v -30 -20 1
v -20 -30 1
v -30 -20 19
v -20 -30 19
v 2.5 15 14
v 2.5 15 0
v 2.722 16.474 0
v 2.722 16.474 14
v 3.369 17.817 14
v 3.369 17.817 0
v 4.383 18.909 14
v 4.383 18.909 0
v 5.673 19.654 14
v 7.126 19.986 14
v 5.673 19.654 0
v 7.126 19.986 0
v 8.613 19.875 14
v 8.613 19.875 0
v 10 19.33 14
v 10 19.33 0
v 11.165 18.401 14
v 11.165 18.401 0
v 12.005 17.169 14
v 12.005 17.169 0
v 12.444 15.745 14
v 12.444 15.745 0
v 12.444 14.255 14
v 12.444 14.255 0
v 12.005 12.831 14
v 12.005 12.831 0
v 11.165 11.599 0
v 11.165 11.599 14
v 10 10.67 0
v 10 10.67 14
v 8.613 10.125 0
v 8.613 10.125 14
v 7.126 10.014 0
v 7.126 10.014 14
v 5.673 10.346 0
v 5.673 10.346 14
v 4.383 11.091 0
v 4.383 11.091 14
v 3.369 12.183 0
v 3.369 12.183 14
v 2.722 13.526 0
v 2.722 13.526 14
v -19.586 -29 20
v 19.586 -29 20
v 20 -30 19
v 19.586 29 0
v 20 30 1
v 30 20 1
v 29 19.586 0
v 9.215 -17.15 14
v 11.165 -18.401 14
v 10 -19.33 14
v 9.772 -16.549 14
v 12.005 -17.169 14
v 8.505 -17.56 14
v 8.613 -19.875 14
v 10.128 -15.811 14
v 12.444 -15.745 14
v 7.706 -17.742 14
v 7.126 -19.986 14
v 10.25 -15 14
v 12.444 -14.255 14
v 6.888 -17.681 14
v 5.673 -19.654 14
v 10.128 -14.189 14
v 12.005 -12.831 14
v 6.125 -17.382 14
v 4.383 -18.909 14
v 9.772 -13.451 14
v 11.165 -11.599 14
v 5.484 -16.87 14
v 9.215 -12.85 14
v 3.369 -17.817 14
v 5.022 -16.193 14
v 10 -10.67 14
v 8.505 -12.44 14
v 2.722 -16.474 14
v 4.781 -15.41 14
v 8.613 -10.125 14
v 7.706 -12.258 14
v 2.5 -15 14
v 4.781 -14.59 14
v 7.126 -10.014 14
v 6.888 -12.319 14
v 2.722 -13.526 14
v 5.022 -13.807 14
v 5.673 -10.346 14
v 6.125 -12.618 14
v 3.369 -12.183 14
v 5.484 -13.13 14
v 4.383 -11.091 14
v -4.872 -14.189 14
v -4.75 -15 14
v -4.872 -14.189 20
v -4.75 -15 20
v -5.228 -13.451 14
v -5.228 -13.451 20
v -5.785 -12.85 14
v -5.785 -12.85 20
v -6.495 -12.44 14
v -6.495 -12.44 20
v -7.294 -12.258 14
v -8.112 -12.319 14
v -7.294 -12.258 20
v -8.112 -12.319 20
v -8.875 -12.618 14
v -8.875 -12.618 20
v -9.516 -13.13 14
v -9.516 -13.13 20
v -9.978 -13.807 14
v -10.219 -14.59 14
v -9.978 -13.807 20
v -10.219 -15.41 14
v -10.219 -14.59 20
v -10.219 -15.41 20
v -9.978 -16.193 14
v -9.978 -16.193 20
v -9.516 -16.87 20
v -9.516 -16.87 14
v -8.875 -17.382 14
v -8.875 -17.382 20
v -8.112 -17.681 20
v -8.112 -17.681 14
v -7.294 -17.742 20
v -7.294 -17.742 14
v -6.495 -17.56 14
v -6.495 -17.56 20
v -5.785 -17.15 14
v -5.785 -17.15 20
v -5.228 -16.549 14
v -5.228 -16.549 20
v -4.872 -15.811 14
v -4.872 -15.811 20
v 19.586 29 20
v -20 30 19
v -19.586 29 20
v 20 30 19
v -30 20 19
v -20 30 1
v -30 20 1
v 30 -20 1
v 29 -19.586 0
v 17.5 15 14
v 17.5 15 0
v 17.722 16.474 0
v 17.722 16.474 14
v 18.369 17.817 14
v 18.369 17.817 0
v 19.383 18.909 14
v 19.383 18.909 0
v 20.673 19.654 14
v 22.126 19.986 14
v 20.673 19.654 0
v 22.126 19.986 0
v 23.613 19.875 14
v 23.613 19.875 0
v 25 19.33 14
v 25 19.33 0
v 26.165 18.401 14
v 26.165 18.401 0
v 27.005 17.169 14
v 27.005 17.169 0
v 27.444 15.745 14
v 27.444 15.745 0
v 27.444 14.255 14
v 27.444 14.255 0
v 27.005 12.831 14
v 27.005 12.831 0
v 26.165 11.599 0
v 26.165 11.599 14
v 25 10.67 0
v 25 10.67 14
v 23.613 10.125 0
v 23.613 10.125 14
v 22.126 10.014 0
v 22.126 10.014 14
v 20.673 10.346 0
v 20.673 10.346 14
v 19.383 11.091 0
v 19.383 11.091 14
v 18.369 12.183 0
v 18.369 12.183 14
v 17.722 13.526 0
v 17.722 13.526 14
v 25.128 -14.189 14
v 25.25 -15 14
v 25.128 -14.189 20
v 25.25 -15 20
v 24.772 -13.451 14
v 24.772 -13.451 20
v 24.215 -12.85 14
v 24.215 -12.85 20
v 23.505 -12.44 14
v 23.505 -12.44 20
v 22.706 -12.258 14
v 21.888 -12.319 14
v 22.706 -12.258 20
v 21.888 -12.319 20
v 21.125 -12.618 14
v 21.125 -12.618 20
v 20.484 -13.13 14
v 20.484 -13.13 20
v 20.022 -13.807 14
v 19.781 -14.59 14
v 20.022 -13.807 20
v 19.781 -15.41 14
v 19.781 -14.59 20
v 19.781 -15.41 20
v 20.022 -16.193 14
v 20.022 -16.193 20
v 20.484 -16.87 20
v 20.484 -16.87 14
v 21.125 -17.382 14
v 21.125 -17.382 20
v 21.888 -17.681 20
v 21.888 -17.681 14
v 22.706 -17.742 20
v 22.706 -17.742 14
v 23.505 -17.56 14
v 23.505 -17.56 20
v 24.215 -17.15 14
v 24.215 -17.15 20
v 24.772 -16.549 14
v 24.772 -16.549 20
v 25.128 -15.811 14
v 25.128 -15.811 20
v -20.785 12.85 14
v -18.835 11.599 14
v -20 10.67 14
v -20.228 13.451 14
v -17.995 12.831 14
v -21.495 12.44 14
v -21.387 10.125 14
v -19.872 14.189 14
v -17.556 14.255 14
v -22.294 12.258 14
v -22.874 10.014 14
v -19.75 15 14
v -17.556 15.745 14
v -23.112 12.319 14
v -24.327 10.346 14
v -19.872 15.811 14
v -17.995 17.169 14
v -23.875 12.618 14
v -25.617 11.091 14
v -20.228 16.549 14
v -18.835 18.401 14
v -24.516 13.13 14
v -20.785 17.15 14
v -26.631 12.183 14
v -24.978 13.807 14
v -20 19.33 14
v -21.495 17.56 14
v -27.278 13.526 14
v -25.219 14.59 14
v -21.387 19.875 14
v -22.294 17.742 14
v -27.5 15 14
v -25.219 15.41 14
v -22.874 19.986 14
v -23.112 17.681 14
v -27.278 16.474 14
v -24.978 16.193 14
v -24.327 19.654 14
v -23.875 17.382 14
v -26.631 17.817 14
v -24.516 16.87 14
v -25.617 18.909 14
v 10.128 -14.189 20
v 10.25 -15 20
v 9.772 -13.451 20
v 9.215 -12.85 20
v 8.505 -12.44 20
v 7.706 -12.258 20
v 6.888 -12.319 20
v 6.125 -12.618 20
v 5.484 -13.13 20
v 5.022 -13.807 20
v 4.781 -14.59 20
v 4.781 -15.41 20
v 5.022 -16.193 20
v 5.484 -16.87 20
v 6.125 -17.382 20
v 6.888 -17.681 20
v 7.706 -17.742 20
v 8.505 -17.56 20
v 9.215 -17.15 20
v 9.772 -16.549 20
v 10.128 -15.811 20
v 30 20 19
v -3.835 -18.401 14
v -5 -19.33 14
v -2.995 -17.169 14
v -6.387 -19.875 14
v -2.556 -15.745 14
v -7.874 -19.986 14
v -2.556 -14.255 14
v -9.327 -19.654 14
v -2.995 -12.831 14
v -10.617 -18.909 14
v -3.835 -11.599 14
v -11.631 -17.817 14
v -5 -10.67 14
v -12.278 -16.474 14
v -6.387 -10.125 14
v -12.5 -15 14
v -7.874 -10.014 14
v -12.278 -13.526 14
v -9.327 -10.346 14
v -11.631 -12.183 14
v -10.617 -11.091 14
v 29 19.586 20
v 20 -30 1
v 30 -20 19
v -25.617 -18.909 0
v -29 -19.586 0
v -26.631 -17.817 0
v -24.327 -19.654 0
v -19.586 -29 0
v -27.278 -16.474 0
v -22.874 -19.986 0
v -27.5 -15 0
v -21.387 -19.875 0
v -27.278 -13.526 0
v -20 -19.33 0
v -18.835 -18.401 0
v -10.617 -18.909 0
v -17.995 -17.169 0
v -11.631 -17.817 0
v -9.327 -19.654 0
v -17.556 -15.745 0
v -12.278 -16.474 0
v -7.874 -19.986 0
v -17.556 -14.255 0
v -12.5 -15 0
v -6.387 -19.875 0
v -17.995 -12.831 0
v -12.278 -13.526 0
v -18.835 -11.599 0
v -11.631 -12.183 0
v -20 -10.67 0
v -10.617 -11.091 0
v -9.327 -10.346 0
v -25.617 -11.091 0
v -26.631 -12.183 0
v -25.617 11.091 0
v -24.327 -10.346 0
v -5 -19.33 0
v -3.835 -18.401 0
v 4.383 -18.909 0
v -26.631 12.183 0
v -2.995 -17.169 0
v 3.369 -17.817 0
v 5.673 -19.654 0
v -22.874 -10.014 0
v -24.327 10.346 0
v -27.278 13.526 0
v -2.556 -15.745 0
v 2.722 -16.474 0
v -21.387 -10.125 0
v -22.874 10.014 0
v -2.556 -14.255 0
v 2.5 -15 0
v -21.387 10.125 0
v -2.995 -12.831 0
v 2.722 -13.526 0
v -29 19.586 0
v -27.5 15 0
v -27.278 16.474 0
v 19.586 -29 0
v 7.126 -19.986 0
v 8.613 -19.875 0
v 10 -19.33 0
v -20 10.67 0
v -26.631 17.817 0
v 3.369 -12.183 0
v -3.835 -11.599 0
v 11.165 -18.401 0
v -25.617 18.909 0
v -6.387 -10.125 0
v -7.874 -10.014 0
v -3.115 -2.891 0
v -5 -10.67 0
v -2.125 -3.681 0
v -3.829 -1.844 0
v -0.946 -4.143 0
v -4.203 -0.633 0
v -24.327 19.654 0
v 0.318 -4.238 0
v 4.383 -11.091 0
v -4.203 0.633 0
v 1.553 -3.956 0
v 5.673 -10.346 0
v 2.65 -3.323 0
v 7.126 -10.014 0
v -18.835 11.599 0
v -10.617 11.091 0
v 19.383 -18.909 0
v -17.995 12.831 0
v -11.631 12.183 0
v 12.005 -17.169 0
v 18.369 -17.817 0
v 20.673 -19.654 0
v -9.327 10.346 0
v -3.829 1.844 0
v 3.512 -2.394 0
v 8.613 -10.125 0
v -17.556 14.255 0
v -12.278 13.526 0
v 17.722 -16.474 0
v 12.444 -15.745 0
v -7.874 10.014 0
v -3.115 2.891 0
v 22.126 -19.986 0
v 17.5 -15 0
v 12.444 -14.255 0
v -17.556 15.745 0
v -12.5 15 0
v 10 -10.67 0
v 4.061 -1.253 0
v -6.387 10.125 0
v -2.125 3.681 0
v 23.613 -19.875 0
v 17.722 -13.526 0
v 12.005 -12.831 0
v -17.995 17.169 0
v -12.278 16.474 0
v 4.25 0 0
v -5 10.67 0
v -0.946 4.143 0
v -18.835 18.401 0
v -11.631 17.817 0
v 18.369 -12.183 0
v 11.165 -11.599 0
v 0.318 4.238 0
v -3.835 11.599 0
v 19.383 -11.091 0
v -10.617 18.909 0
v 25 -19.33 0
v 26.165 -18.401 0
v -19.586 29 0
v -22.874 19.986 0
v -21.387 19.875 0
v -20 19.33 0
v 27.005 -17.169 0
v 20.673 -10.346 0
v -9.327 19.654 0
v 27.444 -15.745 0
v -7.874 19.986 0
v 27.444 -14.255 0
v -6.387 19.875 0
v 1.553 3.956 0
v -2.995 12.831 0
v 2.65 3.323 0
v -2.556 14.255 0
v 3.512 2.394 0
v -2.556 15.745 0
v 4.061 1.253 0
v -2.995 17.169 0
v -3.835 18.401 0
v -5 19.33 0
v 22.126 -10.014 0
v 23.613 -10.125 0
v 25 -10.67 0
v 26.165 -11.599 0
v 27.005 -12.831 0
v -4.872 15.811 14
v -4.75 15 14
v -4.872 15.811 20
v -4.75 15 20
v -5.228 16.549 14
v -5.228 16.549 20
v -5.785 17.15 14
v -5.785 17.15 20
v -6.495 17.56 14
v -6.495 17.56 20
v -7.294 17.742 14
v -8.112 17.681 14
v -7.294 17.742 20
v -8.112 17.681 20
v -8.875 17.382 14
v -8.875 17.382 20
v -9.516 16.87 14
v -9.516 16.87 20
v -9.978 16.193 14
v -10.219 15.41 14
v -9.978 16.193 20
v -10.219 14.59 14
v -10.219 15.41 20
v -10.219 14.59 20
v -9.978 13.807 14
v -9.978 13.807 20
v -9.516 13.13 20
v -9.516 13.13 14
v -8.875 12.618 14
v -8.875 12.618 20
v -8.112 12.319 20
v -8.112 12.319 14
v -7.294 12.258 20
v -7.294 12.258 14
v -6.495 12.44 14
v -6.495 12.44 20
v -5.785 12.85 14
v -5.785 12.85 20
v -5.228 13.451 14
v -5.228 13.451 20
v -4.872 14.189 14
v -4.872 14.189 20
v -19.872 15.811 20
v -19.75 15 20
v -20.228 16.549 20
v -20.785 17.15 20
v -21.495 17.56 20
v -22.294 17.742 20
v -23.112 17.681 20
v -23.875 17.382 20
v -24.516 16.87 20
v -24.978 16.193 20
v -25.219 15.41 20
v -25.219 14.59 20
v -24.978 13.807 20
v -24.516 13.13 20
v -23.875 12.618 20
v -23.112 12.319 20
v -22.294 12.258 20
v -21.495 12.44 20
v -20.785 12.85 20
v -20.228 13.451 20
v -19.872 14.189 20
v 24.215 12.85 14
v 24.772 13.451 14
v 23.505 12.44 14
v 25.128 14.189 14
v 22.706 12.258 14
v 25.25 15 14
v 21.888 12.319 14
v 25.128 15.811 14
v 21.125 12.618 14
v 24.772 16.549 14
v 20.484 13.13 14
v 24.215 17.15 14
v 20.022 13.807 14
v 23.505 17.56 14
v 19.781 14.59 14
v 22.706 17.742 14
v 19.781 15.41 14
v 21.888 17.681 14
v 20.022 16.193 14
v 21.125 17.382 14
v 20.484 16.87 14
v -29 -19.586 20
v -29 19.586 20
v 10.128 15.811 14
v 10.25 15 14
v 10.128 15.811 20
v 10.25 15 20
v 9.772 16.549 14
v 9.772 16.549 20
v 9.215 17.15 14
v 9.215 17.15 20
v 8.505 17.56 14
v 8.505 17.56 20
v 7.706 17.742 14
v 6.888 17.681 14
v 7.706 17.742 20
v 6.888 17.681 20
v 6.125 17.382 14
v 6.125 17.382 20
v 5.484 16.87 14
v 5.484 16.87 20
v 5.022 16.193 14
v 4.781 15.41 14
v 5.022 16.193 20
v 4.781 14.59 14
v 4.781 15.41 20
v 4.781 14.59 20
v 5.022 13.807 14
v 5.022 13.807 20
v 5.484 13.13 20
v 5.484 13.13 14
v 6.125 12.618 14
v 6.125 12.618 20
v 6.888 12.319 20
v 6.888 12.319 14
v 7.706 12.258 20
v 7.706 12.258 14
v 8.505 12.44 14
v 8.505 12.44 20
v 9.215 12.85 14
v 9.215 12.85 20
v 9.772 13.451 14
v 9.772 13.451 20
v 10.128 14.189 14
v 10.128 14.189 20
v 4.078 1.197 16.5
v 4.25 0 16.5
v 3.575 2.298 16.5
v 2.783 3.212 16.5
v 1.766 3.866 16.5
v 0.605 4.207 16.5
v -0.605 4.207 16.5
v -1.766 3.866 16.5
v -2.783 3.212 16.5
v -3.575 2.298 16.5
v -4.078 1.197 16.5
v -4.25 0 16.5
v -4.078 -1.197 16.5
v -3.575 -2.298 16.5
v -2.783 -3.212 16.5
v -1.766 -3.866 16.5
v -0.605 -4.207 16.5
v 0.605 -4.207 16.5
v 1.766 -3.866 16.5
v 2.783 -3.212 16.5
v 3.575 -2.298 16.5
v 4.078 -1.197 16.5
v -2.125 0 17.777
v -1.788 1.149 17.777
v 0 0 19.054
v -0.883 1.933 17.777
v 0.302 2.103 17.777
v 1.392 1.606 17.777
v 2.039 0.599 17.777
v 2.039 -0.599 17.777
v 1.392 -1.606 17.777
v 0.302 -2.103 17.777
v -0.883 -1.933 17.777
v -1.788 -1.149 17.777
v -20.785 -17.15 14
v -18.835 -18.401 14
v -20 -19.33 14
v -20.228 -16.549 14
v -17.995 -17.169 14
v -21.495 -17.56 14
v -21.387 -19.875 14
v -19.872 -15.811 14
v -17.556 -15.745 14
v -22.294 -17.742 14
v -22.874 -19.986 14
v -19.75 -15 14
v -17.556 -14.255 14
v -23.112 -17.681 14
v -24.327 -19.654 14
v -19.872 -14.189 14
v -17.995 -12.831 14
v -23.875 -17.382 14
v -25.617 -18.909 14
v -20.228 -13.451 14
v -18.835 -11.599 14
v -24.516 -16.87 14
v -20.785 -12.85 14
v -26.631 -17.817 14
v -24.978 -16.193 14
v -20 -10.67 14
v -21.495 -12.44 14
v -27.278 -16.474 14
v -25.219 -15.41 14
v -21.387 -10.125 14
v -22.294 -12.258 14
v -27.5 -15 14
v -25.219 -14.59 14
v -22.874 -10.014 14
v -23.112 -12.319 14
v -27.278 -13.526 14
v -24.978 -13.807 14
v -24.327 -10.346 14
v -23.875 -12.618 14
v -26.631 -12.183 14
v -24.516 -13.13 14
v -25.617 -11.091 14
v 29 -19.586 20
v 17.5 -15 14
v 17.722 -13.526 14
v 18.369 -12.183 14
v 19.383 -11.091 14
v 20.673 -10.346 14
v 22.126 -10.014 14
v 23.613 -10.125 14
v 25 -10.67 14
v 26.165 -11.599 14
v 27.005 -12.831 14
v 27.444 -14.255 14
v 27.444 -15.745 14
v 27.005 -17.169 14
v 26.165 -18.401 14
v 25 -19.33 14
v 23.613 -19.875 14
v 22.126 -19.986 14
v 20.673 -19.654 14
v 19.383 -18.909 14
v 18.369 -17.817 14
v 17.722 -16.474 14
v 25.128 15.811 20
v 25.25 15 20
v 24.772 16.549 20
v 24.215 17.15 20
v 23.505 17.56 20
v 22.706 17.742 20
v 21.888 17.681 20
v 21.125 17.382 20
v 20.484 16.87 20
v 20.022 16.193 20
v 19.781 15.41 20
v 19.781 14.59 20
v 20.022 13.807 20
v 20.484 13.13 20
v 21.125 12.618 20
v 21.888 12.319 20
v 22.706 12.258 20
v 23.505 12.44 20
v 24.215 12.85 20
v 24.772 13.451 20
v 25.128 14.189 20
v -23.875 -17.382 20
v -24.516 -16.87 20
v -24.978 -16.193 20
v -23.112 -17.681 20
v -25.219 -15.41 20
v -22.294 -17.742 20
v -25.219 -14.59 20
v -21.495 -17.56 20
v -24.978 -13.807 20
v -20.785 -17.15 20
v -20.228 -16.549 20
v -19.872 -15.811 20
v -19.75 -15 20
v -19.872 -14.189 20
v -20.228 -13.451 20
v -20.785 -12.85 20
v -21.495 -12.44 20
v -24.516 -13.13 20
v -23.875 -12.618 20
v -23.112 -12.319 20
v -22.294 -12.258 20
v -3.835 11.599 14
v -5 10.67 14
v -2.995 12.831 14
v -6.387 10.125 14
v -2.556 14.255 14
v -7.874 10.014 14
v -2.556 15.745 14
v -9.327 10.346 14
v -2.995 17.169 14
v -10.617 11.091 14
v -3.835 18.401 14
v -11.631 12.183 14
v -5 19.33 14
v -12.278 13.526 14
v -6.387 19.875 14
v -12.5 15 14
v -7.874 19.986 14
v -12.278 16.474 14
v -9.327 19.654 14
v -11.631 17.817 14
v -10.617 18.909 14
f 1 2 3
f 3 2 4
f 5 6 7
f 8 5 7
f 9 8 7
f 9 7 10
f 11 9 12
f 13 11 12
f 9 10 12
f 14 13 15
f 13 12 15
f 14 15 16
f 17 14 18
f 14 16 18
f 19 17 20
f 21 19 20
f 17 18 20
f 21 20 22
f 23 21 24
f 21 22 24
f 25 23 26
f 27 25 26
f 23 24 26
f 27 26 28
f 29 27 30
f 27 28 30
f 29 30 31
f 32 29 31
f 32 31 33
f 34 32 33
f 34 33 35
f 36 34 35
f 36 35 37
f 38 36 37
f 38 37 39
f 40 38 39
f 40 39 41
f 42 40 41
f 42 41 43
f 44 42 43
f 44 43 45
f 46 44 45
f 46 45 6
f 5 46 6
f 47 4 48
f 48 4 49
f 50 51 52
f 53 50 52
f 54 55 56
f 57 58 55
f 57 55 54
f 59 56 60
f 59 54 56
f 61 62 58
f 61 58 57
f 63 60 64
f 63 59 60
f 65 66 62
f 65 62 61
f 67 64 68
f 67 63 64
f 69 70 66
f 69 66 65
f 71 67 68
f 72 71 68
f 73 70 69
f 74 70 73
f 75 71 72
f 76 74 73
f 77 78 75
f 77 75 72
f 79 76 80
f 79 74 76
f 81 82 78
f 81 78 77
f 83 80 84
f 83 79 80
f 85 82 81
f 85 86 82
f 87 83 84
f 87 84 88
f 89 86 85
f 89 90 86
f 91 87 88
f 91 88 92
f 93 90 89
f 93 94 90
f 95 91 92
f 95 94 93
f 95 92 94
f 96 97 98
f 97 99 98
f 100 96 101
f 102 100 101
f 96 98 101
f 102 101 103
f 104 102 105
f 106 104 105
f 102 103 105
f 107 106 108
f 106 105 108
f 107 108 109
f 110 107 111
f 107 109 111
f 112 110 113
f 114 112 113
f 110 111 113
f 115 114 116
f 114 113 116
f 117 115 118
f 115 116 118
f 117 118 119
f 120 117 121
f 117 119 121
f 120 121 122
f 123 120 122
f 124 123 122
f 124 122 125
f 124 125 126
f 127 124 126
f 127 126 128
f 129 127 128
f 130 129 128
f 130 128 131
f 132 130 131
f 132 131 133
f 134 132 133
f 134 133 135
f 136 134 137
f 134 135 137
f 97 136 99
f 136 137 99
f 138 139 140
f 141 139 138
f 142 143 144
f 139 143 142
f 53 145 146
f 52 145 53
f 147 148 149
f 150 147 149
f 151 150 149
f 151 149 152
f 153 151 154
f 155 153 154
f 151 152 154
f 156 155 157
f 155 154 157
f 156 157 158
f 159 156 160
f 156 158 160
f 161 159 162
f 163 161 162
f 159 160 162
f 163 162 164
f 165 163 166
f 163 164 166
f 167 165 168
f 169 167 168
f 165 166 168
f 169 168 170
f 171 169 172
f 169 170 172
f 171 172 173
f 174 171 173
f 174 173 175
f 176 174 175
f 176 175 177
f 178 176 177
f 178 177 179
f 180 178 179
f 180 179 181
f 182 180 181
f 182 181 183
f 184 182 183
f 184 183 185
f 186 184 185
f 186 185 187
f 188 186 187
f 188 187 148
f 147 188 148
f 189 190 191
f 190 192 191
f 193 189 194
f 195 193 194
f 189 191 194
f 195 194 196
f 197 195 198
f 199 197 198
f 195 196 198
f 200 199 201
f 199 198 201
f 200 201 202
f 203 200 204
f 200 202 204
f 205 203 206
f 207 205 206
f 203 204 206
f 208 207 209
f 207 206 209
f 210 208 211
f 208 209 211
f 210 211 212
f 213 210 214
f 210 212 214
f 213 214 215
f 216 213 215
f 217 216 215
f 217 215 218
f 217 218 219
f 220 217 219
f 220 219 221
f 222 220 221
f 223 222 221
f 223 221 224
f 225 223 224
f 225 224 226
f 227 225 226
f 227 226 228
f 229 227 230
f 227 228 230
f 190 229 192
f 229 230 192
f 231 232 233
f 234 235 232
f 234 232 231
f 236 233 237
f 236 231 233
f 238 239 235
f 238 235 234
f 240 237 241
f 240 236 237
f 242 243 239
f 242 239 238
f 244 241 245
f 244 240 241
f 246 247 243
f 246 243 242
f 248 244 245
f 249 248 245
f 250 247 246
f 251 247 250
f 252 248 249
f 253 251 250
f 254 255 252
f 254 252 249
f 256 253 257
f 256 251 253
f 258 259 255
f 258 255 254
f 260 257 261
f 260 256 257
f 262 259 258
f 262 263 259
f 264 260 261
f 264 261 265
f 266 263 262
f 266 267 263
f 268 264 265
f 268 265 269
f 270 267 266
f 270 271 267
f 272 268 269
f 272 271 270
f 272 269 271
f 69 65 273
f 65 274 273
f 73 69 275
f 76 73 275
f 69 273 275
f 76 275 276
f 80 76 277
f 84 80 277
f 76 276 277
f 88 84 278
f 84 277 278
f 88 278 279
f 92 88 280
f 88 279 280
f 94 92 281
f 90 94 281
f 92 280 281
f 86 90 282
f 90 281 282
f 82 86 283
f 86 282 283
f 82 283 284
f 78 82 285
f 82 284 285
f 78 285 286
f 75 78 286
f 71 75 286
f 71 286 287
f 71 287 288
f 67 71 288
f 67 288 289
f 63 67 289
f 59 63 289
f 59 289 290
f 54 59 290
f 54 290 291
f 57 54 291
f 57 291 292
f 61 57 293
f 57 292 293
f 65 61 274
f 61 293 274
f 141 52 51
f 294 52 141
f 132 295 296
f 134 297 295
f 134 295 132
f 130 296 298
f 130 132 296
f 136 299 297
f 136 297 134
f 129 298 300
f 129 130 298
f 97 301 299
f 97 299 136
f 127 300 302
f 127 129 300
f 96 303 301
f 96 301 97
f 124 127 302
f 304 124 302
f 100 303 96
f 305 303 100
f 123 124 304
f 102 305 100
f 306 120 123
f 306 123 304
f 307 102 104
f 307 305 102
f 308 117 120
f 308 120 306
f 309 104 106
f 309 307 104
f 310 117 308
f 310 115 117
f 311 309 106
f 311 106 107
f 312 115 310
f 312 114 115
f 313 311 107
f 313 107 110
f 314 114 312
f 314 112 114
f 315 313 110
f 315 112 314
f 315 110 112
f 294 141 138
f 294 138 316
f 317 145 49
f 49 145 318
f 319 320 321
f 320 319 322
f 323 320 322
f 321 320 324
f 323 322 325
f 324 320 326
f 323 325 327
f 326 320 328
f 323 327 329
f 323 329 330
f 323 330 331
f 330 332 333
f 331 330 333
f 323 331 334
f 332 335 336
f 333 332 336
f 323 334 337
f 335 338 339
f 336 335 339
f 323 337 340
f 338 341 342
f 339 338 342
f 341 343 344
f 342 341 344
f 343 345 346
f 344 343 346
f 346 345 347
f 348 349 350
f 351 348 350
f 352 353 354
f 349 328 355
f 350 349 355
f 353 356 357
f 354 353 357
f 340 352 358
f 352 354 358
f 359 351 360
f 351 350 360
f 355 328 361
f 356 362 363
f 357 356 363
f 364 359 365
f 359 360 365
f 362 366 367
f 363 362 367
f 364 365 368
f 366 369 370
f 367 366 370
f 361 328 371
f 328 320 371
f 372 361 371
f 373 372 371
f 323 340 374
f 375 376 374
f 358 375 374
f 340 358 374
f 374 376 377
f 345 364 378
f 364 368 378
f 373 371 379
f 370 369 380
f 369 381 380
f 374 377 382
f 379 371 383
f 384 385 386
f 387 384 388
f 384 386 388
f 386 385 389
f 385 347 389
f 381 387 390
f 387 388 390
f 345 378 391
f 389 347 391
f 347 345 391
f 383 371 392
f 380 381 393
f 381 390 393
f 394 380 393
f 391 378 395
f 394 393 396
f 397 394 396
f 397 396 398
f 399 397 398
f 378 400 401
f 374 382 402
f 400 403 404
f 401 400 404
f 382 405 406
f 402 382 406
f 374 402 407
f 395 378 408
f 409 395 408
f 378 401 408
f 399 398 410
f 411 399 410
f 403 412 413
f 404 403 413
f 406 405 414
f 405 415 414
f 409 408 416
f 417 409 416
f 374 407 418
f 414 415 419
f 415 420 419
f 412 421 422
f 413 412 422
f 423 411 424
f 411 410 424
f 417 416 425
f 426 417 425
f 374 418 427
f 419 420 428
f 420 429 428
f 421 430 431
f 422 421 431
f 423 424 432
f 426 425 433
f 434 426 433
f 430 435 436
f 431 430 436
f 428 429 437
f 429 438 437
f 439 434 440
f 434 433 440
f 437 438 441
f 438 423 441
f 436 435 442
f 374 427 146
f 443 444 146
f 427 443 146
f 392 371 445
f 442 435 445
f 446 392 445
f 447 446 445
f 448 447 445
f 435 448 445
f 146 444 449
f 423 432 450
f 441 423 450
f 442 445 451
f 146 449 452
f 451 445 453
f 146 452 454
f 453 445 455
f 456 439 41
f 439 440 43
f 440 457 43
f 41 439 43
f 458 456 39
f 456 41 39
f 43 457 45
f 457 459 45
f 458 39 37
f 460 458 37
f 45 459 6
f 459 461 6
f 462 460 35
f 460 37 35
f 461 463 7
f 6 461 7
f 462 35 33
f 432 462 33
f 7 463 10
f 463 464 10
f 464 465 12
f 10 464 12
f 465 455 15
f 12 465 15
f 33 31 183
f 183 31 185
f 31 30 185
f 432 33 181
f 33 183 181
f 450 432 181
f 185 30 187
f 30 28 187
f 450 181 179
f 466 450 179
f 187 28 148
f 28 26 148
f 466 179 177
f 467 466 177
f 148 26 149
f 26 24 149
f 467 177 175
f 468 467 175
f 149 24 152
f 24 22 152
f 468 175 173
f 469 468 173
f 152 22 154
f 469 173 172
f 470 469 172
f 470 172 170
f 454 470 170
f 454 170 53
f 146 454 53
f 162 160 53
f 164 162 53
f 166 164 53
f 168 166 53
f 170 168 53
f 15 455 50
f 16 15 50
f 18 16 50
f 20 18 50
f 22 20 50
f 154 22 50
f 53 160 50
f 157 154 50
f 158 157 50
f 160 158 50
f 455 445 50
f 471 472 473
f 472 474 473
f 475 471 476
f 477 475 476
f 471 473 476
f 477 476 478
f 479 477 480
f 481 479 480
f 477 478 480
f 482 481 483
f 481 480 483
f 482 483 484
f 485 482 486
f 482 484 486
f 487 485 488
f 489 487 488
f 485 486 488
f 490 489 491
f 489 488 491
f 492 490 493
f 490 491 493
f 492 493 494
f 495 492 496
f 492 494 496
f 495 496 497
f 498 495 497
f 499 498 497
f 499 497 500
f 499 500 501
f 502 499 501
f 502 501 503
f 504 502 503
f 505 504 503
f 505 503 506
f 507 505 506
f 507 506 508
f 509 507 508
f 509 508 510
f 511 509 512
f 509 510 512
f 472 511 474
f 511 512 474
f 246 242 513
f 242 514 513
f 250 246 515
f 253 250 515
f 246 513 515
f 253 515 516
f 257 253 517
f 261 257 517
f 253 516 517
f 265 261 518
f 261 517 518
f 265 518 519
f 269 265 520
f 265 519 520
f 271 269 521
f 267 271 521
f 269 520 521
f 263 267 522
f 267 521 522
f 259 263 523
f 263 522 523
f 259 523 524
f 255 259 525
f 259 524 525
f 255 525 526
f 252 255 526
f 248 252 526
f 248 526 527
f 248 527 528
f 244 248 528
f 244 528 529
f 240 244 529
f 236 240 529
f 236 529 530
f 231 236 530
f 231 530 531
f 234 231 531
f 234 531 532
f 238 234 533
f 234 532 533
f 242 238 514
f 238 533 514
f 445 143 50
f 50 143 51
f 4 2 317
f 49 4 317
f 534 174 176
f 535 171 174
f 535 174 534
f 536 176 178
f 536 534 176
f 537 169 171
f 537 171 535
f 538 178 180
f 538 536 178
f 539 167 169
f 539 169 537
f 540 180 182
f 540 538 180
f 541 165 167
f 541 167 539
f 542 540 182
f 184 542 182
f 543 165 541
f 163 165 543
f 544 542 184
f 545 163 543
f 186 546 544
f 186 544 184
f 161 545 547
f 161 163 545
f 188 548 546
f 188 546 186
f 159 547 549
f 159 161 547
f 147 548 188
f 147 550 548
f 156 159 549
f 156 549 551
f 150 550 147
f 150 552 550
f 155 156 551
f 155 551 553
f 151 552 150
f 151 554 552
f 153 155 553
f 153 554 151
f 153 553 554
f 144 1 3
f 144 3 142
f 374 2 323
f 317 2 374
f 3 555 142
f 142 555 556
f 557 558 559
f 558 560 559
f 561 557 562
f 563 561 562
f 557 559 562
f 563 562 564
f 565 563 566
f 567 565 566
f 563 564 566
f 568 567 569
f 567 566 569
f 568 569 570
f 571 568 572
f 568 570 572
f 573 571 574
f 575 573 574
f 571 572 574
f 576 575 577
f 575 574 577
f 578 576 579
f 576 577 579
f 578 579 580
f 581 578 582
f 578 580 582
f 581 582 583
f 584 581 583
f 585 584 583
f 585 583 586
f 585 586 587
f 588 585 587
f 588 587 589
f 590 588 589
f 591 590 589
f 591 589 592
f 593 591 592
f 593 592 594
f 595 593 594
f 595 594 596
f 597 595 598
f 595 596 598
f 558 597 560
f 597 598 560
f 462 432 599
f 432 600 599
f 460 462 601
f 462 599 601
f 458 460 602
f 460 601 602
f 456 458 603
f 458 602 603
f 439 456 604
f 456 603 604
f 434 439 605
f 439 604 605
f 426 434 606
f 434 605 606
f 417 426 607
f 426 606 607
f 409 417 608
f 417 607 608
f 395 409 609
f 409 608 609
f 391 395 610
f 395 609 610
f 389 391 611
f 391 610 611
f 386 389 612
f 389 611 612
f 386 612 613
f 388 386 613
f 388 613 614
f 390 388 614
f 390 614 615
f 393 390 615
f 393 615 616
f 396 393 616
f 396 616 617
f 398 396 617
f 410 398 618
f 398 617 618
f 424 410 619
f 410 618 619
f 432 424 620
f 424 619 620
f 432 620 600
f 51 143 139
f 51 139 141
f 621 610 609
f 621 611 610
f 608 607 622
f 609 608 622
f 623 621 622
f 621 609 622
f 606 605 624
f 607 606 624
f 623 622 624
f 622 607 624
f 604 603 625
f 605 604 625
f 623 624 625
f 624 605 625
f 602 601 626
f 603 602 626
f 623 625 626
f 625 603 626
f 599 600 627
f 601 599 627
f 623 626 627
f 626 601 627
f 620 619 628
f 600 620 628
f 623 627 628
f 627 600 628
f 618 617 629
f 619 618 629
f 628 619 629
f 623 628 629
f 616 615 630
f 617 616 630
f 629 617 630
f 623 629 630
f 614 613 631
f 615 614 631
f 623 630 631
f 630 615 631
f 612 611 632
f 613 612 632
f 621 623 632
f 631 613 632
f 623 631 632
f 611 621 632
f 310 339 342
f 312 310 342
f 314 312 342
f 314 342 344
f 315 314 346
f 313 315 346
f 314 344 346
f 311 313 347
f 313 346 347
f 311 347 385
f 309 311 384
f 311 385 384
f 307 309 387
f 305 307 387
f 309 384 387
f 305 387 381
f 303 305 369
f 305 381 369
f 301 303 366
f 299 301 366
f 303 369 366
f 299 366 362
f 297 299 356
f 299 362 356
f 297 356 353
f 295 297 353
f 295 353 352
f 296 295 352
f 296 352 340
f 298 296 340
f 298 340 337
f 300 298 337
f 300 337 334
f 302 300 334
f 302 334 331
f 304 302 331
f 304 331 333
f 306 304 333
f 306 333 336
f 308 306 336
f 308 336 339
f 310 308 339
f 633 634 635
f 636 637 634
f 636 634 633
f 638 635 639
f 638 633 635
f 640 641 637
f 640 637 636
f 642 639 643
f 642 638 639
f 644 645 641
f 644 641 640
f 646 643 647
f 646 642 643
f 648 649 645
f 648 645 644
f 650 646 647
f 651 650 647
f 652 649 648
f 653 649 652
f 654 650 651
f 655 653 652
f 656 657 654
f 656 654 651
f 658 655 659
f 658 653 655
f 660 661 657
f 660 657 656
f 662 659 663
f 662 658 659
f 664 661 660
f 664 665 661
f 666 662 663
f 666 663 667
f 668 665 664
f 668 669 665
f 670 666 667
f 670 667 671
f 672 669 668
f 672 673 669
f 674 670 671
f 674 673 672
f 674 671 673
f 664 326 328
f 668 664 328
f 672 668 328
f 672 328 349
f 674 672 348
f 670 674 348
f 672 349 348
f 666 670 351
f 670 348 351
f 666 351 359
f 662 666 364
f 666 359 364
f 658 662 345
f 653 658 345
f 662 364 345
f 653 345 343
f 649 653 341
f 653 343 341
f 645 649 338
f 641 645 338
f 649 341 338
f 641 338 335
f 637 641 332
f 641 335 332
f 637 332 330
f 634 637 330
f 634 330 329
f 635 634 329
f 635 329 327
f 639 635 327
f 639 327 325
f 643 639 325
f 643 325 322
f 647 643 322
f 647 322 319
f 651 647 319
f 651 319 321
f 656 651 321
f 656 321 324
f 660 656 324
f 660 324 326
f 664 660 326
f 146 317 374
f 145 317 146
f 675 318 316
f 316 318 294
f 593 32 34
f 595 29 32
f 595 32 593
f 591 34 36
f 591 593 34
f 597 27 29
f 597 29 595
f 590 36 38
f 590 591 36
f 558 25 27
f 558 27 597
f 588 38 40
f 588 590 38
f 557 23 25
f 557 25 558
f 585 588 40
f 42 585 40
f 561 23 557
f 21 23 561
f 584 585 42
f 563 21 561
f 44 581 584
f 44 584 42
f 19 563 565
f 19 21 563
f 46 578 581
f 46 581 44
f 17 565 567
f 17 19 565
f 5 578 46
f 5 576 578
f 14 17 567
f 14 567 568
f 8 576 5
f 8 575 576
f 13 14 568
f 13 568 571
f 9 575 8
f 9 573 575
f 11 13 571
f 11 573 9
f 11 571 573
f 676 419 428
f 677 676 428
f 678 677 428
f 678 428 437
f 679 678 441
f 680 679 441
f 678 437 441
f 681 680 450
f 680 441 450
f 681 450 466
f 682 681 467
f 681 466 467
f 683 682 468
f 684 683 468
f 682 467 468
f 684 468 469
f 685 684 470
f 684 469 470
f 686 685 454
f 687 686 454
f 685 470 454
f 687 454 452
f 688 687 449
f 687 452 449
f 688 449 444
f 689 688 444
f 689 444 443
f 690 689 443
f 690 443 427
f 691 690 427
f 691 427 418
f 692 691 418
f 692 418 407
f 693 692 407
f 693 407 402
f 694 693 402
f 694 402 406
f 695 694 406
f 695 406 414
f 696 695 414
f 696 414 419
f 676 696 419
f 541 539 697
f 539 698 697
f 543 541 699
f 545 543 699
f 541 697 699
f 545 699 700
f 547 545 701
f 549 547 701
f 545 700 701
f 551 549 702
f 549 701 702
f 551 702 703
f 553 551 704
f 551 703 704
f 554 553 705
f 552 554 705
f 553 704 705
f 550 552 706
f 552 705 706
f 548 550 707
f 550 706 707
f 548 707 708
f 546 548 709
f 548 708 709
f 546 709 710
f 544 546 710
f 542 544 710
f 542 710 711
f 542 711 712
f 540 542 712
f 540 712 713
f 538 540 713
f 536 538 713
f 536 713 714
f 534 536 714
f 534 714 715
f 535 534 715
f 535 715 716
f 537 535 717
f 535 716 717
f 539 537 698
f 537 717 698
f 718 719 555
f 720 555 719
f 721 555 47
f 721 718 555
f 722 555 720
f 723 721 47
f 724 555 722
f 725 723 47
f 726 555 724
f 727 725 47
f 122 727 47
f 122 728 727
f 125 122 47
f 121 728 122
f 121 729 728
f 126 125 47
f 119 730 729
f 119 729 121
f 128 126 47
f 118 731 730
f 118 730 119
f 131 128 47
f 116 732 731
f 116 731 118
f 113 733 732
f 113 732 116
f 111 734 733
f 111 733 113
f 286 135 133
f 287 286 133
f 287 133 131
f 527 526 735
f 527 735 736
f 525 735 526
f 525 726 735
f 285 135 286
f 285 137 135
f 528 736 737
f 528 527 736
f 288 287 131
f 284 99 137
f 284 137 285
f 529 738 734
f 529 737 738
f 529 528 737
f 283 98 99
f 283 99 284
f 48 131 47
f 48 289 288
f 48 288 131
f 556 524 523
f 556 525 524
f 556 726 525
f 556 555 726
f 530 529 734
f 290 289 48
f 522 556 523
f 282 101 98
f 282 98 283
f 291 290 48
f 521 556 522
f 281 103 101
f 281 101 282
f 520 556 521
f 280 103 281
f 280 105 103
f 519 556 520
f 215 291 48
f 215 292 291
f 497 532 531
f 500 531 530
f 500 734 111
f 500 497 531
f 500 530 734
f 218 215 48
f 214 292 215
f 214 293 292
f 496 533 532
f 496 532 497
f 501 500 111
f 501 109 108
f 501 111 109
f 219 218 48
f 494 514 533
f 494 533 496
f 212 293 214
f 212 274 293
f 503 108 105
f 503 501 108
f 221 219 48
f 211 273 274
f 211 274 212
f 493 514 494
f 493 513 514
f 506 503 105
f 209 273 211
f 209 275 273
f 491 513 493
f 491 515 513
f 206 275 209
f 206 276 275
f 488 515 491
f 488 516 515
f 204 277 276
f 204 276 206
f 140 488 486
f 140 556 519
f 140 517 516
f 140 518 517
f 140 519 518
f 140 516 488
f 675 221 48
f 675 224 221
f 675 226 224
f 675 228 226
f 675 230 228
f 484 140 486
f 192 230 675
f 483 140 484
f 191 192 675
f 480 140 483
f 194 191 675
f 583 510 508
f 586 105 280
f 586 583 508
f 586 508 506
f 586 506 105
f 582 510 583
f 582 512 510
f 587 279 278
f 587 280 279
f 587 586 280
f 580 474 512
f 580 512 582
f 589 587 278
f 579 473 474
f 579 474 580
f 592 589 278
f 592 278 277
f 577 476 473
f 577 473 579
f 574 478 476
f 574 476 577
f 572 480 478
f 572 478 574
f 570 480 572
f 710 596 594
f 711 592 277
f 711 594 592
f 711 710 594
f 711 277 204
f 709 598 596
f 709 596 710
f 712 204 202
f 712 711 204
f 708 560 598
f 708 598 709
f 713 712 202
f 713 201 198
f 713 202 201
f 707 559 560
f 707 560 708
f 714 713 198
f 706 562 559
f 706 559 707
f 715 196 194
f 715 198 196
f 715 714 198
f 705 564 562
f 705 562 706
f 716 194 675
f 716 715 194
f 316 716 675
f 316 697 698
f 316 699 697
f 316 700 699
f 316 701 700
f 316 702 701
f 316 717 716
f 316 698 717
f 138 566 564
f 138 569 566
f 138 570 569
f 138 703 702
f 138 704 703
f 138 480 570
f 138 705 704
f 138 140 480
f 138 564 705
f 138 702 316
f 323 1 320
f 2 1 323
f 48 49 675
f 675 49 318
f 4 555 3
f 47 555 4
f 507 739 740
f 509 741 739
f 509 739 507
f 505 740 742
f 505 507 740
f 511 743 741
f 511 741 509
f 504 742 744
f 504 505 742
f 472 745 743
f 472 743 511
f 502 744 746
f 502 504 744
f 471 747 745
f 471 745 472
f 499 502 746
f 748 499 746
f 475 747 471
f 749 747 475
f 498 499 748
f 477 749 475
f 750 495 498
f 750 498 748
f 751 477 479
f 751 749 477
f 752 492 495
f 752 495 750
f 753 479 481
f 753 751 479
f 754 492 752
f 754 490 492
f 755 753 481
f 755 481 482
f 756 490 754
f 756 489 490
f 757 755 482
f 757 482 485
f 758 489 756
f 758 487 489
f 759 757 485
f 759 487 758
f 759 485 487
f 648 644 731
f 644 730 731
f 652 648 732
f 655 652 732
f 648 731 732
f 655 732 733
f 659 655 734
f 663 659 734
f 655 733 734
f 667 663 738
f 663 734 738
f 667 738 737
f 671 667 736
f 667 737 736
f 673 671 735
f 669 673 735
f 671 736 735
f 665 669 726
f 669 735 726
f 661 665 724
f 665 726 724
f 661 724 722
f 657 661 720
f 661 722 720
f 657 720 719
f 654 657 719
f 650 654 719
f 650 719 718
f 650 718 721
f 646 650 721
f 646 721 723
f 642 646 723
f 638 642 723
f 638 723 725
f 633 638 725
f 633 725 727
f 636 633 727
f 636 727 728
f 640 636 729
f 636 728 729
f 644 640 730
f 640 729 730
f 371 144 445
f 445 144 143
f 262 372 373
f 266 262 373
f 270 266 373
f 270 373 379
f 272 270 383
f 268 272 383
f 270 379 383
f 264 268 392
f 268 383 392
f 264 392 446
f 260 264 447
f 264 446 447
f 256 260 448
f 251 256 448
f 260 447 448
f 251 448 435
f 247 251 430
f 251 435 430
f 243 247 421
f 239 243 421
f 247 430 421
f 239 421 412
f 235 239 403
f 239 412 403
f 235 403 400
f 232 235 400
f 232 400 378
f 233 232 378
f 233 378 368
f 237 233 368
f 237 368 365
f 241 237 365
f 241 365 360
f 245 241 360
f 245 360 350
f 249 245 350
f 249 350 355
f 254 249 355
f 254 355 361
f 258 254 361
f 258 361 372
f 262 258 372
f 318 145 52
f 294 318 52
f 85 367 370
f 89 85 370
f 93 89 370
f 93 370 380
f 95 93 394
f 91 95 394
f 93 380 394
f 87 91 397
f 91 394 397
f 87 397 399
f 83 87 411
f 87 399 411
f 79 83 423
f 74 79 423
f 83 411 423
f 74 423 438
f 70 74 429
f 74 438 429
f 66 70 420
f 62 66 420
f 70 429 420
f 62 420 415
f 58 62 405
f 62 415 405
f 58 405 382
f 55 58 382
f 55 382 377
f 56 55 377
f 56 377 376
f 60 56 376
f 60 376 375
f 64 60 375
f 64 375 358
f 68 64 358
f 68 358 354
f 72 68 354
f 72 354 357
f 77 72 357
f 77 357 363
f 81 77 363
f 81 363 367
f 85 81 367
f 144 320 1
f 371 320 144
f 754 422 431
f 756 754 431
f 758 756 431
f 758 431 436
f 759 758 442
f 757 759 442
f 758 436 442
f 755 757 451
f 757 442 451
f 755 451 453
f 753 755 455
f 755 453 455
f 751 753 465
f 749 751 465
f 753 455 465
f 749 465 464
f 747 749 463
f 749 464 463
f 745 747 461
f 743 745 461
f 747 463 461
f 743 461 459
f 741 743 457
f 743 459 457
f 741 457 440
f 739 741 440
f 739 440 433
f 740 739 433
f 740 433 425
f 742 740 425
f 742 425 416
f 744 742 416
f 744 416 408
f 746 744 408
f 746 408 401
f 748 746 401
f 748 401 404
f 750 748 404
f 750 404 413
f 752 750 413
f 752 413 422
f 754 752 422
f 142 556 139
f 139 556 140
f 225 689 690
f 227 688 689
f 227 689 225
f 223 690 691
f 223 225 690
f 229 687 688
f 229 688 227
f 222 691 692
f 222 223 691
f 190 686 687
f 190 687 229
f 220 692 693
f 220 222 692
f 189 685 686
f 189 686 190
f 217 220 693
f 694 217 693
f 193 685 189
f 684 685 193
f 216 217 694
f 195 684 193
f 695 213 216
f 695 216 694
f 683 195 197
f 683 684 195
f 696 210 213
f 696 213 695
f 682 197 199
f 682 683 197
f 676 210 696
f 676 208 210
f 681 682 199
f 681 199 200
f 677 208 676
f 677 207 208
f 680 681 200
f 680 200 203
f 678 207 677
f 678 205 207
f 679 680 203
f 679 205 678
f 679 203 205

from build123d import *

# Parameters (mm, degrees)
SKETCH_1_W                = 60
SKETCH_1_H                = 60
EXTRUDE_1_DEPTH           = 20
HOLE_WIZARD_1_D           = 5.5
HOLE_WIZARD_1_CBORE_D     = 10
HOLE_WIZARD_1_CBORE_DEPTH = 14
CHAMFER_1_SIZE            = 10
CHAMFER_2_SIZE            = 1
HOLE_WIZARD_M10_1_D       = 8.5
HOLE_WIZARD_M10_1_DEPTH   = 16.5
HOLE_WIZARD_M10_1_TIP     = 2.553657631


with BuildPart() as part:
    # 草图1 → 凸台-拉伸1 (new body)
    with BuildSketch(Plane.XY):
        Rectangle(SKETCH_1_W, SKETCH_1_H)
    extrude(amount=EXTRUDE_1_DEPTH)

    # 打孔尺寸(%根据)内六角圆柱头螺钉的类型1 (through all)
    with Locations(Plane(origin=(0, 0, 0), x_dir=(-1, 0, 0), z_dir=(0, 0, -1))):
        with Locations((-22.5, 15), (-22.5, -15), (-7.5, 15), (-7.5, -15), (22.5, -15), (7.5, 15), (7.5, -15), (22.5, 15)):
            CounterBoreHole(HOLE_WIZARD_1_D / 2, HOLE_WIZARD_1_CBORE_D / 2, HOLE_WIZARD_1_CBORE_DEPTH)

    # 倒角1
    chamfer_1_edges = [part.edges().sort_by_distance(p)[0] for p in [
        (30, -30, 10),
        (-30, -30, 10),
        (-30, 30, 10),
        (30, 30, 10),
    ]]
    chamfer(chamfer_1_edges, length=CHAMFER_1_SIZE)

    # 倒角2
    chamfer_2_edges = [part.edges().sort_by_distance(p)[0] for p in [
        (0, -30, 0),
        (0, -30, 20),
        (30, 0, 0),
        (-30, 0, 0),
        (0, 30, 0),
        (25, 25, 0),
        (25, -25, 0),
        (-25, 25, 0),
        (-25, -25, 0),
        (-30, 0, 20),
        (30, 0, 20),
        (0, 30, 20),
        (25, 25, 20),
        (25, -25, 20),
        (-25, 25, 20),
        (-25, -25, 20),
    ]]
    chamfer(chamfer_2_edges, length=CHAMFER_2_SIZE)

    # M10 螺纹孔1
    with Locations(Plane(origin=(0, 0, 0), x_dir=(-1, 0, 0), z_dir=(0, 0, -1))):
        with Locations((0, 0)):
            Hole(HOLE_WIZARD_M10_1_D / 2, depth=HOLE_WIZARD_M10_1_DEPTH)
            with Locations((0, 0, -(HOLE_WIZARD_M10_1_DEPTH + HOLE_WIZARD_M10_1_TIP / 2))):  # 118° drill point
                Cone(0, HOLE_WIZARD_M10_1_D / 2, HOLE_WIZARD_M10_1_TIP, mode=Mode.SUBTRACT)


solid = part.part
